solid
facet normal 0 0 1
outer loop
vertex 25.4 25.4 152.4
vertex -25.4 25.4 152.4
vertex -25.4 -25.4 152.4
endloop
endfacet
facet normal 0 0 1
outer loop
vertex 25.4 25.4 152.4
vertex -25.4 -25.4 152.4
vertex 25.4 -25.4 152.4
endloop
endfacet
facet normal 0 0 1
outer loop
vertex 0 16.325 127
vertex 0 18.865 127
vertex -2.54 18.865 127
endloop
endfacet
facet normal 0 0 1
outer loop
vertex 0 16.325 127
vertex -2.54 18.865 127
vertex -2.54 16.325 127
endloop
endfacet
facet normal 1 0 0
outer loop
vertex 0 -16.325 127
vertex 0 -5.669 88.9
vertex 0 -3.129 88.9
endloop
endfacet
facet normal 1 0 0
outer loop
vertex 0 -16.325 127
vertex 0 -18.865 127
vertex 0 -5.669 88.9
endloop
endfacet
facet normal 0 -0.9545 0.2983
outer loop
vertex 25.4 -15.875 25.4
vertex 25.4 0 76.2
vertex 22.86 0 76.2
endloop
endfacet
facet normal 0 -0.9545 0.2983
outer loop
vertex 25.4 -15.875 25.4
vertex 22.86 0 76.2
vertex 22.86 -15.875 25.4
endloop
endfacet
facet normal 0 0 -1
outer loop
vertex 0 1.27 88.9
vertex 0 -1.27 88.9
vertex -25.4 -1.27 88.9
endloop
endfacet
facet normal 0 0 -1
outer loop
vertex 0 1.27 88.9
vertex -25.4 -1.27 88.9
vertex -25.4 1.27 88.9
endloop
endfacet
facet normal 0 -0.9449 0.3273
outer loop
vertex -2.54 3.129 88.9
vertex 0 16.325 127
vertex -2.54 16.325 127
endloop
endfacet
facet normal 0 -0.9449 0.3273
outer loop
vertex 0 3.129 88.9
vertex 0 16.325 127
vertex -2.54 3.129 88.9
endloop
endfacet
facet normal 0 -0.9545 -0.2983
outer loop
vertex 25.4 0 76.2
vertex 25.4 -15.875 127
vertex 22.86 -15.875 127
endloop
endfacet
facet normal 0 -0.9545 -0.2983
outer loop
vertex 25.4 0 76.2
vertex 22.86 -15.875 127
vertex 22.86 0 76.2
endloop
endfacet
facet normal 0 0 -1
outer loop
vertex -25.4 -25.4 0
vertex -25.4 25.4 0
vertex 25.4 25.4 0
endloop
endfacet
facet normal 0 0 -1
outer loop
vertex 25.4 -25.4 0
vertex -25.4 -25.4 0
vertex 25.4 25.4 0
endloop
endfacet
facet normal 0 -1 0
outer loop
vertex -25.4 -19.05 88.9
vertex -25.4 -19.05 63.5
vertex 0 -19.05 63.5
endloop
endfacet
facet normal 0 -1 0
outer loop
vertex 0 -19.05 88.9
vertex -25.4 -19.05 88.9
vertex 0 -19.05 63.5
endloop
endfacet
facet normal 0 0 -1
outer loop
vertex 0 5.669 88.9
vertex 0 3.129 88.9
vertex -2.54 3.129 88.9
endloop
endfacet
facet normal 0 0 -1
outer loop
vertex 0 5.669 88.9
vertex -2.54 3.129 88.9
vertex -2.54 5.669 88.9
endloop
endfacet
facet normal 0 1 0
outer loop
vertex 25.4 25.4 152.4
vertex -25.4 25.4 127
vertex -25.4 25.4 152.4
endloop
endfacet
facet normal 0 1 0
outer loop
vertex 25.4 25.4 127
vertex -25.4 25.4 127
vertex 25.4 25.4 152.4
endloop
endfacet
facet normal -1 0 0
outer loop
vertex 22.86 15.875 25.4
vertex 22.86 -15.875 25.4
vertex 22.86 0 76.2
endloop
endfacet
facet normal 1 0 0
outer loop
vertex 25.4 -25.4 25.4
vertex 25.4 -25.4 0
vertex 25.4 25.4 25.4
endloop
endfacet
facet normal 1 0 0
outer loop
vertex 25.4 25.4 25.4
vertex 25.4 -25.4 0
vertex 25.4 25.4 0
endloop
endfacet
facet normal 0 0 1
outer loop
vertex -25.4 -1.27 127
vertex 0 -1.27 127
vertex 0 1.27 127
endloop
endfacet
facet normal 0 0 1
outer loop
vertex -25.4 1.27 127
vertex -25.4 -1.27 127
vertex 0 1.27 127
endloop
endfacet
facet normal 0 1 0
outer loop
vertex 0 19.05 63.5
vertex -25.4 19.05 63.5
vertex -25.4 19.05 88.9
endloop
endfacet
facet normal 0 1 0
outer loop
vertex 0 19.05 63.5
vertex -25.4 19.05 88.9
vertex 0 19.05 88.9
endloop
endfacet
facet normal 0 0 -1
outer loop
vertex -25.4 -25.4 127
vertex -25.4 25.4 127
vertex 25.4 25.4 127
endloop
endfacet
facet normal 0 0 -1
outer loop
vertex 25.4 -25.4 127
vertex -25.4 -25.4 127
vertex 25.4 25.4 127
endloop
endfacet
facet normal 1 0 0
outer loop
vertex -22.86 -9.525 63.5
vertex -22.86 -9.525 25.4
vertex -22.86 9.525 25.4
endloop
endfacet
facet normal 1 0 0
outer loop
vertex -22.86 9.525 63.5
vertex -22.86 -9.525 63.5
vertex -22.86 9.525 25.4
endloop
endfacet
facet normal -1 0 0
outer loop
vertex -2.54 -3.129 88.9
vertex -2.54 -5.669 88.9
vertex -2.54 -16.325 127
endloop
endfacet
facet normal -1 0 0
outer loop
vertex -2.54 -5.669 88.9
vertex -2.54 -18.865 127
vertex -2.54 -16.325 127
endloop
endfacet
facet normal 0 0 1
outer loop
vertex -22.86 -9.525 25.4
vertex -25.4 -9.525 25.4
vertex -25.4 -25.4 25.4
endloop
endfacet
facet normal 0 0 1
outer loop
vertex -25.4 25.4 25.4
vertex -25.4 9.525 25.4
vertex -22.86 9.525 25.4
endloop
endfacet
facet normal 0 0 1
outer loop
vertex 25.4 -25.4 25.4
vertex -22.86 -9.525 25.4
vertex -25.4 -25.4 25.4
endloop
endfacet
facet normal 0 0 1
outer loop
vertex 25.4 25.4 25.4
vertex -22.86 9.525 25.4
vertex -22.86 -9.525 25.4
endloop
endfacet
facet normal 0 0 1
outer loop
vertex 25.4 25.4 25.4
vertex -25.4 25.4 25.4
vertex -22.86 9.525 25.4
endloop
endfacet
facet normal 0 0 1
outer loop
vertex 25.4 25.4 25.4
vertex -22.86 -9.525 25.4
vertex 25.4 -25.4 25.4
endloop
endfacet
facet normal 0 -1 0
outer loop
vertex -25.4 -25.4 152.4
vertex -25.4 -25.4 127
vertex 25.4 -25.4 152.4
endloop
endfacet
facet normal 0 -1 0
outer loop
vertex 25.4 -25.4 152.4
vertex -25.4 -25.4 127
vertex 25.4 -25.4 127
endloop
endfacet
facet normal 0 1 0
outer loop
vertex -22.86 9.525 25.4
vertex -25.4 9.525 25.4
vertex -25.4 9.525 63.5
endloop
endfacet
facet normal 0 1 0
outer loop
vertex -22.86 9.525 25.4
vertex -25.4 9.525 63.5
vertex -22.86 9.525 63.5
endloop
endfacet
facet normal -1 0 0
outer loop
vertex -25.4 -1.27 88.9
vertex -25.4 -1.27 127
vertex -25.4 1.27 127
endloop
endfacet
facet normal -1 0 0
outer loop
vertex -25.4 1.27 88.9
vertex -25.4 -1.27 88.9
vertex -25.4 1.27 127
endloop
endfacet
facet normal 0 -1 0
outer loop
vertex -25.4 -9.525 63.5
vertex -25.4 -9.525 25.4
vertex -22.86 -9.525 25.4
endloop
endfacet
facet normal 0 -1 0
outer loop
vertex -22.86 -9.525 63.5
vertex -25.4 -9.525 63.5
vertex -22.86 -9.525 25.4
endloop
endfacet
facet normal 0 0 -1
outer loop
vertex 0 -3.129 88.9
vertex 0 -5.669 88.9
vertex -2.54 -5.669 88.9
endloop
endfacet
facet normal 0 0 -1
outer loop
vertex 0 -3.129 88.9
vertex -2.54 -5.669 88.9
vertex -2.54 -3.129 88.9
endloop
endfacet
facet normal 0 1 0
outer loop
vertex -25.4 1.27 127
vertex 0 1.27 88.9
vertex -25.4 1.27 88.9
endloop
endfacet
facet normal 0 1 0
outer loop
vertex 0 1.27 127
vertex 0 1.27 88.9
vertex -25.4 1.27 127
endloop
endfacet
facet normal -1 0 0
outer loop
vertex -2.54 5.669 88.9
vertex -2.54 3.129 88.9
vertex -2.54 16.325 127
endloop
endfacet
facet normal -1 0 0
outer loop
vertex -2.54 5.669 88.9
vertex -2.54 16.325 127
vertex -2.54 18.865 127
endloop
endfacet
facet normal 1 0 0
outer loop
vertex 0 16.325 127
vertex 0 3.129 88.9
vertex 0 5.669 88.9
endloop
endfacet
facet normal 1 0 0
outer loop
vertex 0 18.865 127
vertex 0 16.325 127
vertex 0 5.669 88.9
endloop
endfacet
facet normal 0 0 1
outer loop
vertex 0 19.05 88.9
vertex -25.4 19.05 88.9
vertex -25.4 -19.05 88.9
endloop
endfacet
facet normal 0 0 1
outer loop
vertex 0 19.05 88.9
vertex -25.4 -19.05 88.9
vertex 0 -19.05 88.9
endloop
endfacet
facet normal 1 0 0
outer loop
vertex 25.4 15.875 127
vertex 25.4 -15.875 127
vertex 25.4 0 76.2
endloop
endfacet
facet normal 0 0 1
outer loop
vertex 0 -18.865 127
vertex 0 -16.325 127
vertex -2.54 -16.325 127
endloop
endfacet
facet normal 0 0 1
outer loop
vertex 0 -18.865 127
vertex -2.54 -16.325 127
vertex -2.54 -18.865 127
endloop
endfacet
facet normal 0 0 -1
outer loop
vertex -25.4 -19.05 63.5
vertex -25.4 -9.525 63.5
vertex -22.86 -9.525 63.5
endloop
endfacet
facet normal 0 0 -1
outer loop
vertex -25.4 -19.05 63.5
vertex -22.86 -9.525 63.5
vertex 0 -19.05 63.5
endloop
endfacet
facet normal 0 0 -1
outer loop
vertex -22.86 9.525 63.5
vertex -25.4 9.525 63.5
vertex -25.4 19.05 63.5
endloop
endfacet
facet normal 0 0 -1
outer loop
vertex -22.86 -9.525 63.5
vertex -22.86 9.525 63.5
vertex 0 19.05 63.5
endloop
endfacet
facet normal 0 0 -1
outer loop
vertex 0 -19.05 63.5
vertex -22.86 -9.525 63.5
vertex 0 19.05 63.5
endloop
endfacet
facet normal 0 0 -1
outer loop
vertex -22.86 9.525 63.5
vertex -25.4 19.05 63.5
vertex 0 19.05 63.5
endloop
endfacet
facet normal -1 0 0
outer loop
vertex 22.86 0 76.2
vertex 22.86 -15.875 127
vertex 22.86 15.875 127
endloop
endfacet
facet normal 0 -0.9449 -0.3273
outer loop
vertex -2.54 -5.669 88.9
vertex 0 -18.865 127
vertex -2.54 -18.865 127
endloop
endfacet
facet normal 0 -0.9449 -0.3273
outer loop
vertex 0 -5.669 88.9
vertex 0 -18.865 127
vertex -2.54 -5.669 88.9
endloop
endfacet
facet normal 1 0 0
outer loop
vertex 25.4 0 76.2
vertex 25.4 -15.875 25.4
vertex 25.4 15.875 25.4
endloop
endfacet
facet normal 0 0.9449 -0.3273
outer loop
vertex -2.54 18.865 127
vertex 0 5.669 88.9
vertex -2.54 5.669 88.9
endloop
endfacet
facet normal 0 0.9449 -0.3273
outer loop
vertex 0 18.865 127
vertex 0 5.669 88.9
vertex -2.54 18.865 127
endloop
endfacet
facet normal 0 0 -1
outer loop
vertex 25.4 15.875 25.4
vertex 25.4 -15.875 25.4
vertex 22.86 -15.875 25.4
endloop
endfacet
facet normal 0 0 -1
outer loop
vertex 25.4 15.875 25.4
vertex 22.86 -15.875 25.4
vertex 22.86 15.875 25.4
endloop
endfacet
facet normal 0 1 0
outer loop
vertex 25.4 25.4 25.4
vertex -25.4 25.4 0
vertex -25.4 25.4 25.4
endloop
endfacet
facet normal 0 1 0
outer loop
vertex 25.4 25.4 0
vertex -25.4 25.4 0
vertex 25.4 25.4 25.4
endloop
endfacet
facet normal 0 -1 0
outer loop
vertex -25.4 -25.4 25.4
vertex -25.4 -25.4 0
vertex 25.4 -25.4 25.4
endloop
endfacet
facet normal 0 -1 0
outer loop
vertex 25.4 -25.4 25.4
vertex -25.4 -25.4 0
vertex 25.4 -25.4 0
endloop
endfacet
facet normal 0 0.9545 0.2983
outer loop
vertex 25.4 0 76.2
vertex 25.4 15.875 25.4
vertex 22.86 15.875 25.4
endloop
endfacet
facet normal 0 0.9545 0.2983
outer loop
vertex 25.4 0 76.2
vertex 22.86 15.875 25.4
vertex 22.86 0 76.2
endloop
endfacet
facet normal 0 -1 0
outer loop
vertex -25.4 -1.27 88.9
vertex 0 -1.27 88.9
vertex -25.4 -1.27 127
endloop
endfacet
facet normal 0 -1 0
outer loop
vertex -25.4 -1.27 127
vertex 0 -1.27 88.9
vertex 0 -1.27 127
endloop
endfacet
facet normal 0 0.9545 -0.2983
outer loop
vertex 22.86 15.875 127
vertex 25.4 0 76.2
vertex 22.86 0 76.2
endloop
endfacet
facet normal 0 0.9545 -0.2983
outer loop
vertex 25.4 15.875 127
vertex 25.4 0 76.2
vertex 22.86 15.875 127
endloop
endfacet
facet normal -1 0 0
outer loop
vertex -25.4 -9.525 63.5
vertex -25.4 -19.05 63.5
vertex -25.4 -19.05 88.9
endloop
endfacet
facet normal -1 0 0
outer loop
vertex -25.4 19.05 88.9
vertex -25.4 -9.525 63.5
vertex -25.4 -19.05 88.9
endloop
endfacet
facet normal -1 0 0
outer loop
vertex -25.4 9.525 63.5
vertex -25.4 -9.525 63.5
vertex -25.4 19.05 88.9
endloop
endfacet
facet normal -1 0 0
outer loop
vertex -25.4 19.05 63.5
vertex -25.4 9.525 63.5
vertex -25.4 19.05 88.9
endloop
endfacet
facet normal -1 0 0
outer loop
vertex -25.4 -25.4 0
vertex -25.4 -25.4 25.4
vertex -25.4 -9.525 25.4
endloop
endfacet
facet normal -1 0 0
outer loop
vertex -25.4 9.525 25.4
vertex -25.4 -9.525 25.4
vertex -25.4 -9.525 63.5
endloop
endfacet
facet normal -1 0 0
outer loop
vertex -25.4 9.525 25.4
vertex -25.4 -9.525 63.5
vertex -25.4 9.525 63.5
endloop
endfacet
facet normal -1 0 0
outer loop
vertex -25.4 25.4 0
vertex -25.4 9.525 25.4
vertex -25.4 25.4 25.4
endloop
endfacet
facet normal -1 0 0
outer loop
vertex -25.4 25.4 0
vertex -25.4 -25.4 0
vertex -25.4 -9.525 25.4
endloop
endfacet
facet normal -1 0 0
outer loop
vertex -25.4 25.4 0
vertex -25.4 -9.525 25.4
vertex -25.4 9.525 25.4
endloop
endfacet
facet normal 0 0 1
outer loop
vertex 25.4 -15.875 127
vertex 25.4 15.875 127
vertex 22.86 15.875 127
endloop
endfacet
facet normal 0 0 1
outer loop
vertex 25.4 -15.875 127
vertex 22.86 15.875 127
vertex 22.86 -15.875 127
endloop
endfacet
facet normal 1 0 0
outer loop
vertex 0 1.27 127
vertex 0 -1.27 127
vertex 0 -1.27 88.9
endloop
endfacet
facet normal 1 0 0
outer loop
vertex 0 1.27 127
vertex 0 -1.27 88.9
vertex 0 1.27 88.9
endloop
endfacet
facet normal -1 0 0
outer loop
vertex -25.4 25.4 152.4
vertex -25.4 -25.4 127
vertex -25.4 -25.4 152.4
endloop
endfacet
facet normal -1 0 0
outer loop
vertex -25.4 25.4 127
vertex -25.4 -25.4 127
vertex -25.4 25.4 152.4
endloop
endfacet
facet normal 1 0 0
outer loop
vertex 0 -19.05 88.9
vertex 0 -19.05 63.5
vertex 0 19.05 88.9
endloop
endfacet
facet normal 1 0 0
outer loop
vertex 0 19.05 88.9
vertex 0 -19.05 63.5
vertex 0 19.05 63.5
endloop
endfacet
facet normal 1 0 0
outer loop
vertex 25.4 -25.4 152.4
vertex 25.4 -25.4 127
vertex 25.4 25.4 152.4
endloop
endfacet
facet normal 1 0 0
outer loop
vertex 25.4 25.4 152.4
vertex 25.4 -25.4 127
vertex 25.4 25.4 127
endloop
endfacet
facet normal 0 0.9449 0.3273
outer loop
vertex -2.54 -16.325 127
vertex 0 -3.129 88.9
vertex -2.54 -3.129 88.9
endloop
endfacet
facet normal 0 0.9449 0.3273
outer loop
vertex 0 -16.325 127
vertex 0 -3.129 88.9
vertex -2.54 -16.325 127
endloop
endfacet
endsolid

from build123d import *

# Parameters (mm, degrees)
F0_W      = 50.8
F0_H      = 50.8
F1_DEPTH  = 25.4
F2_W      = 2.54
F2_H      = 19.05
F3_DEPTH  = 38.1
F4_W      = 25.4
F4_H      = 38.1
F5_DEPTH  = 25.4
F6_W      = 2.54
F6_H      = 38.1
F7_DEPTH  = 25.4
F9_DEPTH  = 2.54
F10_W     = 50.8
F10_H     = 50.8
F11_DEPTH = 25.4
F13_DEPTH = 2.54


with BuildPart() as f1:
    # F0 (on Top) → F1 (new body)
    with BuildSketch(Plane.XY):
        Rectangle(F0_W, F0_H)
    extrude(amount=F1_DEPTH)

    # F2 (on face) → F3 (join)
    with BuildSketch(Plane.XY.offset(25.4)):
        with Locations((-24.13, 0)):
            Rectangle(F2_W, F2_H)
    extrude(amount=F3_DEPTH)

    # F4 (on face) → F5 (join)
    with BuildSketch(Plane.XY.offset(63.5)):
        with Locations((-12.7, 0)):
            Rectangle(F4_W, F4_H)
    extrude(amount=F5_DEPTH)


with BuildPart() as f7:
    # F6 (on face) → F7 (new body)
    with BuildSketch(Plane.YZ):
        with Locations((0, 107.95)):
            Rectangle(F6_W, F6_H)
    extrude(amount=-F7_DEPTH)


with BuildPart() as f9:
    # F8 (on face) → F9 (new body)
    with BuildSketch(Plane.YZ):
        Polygon((16.324653252, 127), (3.128663313, 88.9), (5.668663313, 88.9), (18.864653252, 127), align=None)
    extrude(amount=-F9_DEPTH)


with BuildPart() as f9b:
    # F8 (on face) → F9, piece 2 (new body)
    with BuildSketch(Plane.YZ):
        Polygon((-5.668663313, 88.9), (-3.128663313, 88.9), (-16.324653252, 127), (-18.864653252, 127), align=None)
    extrude(amount=-F9_DEPTH)


with BuildPart() as f11:
    # F10 (on face) → F11 (new body)
    with BuildSketch(Plane.XY.offset(127)):
        Rectangle(F10_W, F10_H)
    extrude(amount=F11_DEPTH)


with BuildPart() as f13:
    # F12 (on face) → F13 (new body)
    with BuildSketch(Plane.YZ.offset(25.4)):
        Polygon((-15.875, 127), (0, 76.2), (15.875, 127), align=None)
    extrude(amount=-F13_DEPTH)


with BuildPart() as f13b:
    # F12 (on face) → F13, piece 2 (new body)
    with BuildSketch(Plane.YZ.offset(25.4)):
        Polygon((0, 76.2), (-15.875, 25.4), (15.875, 25.4), align=None)
    extrude(amount=-F13_DEPTH)


solid = Compound([f1.part, f7.part, f9.part, f9b.part, f11.part, f13.part, f13b.part])
